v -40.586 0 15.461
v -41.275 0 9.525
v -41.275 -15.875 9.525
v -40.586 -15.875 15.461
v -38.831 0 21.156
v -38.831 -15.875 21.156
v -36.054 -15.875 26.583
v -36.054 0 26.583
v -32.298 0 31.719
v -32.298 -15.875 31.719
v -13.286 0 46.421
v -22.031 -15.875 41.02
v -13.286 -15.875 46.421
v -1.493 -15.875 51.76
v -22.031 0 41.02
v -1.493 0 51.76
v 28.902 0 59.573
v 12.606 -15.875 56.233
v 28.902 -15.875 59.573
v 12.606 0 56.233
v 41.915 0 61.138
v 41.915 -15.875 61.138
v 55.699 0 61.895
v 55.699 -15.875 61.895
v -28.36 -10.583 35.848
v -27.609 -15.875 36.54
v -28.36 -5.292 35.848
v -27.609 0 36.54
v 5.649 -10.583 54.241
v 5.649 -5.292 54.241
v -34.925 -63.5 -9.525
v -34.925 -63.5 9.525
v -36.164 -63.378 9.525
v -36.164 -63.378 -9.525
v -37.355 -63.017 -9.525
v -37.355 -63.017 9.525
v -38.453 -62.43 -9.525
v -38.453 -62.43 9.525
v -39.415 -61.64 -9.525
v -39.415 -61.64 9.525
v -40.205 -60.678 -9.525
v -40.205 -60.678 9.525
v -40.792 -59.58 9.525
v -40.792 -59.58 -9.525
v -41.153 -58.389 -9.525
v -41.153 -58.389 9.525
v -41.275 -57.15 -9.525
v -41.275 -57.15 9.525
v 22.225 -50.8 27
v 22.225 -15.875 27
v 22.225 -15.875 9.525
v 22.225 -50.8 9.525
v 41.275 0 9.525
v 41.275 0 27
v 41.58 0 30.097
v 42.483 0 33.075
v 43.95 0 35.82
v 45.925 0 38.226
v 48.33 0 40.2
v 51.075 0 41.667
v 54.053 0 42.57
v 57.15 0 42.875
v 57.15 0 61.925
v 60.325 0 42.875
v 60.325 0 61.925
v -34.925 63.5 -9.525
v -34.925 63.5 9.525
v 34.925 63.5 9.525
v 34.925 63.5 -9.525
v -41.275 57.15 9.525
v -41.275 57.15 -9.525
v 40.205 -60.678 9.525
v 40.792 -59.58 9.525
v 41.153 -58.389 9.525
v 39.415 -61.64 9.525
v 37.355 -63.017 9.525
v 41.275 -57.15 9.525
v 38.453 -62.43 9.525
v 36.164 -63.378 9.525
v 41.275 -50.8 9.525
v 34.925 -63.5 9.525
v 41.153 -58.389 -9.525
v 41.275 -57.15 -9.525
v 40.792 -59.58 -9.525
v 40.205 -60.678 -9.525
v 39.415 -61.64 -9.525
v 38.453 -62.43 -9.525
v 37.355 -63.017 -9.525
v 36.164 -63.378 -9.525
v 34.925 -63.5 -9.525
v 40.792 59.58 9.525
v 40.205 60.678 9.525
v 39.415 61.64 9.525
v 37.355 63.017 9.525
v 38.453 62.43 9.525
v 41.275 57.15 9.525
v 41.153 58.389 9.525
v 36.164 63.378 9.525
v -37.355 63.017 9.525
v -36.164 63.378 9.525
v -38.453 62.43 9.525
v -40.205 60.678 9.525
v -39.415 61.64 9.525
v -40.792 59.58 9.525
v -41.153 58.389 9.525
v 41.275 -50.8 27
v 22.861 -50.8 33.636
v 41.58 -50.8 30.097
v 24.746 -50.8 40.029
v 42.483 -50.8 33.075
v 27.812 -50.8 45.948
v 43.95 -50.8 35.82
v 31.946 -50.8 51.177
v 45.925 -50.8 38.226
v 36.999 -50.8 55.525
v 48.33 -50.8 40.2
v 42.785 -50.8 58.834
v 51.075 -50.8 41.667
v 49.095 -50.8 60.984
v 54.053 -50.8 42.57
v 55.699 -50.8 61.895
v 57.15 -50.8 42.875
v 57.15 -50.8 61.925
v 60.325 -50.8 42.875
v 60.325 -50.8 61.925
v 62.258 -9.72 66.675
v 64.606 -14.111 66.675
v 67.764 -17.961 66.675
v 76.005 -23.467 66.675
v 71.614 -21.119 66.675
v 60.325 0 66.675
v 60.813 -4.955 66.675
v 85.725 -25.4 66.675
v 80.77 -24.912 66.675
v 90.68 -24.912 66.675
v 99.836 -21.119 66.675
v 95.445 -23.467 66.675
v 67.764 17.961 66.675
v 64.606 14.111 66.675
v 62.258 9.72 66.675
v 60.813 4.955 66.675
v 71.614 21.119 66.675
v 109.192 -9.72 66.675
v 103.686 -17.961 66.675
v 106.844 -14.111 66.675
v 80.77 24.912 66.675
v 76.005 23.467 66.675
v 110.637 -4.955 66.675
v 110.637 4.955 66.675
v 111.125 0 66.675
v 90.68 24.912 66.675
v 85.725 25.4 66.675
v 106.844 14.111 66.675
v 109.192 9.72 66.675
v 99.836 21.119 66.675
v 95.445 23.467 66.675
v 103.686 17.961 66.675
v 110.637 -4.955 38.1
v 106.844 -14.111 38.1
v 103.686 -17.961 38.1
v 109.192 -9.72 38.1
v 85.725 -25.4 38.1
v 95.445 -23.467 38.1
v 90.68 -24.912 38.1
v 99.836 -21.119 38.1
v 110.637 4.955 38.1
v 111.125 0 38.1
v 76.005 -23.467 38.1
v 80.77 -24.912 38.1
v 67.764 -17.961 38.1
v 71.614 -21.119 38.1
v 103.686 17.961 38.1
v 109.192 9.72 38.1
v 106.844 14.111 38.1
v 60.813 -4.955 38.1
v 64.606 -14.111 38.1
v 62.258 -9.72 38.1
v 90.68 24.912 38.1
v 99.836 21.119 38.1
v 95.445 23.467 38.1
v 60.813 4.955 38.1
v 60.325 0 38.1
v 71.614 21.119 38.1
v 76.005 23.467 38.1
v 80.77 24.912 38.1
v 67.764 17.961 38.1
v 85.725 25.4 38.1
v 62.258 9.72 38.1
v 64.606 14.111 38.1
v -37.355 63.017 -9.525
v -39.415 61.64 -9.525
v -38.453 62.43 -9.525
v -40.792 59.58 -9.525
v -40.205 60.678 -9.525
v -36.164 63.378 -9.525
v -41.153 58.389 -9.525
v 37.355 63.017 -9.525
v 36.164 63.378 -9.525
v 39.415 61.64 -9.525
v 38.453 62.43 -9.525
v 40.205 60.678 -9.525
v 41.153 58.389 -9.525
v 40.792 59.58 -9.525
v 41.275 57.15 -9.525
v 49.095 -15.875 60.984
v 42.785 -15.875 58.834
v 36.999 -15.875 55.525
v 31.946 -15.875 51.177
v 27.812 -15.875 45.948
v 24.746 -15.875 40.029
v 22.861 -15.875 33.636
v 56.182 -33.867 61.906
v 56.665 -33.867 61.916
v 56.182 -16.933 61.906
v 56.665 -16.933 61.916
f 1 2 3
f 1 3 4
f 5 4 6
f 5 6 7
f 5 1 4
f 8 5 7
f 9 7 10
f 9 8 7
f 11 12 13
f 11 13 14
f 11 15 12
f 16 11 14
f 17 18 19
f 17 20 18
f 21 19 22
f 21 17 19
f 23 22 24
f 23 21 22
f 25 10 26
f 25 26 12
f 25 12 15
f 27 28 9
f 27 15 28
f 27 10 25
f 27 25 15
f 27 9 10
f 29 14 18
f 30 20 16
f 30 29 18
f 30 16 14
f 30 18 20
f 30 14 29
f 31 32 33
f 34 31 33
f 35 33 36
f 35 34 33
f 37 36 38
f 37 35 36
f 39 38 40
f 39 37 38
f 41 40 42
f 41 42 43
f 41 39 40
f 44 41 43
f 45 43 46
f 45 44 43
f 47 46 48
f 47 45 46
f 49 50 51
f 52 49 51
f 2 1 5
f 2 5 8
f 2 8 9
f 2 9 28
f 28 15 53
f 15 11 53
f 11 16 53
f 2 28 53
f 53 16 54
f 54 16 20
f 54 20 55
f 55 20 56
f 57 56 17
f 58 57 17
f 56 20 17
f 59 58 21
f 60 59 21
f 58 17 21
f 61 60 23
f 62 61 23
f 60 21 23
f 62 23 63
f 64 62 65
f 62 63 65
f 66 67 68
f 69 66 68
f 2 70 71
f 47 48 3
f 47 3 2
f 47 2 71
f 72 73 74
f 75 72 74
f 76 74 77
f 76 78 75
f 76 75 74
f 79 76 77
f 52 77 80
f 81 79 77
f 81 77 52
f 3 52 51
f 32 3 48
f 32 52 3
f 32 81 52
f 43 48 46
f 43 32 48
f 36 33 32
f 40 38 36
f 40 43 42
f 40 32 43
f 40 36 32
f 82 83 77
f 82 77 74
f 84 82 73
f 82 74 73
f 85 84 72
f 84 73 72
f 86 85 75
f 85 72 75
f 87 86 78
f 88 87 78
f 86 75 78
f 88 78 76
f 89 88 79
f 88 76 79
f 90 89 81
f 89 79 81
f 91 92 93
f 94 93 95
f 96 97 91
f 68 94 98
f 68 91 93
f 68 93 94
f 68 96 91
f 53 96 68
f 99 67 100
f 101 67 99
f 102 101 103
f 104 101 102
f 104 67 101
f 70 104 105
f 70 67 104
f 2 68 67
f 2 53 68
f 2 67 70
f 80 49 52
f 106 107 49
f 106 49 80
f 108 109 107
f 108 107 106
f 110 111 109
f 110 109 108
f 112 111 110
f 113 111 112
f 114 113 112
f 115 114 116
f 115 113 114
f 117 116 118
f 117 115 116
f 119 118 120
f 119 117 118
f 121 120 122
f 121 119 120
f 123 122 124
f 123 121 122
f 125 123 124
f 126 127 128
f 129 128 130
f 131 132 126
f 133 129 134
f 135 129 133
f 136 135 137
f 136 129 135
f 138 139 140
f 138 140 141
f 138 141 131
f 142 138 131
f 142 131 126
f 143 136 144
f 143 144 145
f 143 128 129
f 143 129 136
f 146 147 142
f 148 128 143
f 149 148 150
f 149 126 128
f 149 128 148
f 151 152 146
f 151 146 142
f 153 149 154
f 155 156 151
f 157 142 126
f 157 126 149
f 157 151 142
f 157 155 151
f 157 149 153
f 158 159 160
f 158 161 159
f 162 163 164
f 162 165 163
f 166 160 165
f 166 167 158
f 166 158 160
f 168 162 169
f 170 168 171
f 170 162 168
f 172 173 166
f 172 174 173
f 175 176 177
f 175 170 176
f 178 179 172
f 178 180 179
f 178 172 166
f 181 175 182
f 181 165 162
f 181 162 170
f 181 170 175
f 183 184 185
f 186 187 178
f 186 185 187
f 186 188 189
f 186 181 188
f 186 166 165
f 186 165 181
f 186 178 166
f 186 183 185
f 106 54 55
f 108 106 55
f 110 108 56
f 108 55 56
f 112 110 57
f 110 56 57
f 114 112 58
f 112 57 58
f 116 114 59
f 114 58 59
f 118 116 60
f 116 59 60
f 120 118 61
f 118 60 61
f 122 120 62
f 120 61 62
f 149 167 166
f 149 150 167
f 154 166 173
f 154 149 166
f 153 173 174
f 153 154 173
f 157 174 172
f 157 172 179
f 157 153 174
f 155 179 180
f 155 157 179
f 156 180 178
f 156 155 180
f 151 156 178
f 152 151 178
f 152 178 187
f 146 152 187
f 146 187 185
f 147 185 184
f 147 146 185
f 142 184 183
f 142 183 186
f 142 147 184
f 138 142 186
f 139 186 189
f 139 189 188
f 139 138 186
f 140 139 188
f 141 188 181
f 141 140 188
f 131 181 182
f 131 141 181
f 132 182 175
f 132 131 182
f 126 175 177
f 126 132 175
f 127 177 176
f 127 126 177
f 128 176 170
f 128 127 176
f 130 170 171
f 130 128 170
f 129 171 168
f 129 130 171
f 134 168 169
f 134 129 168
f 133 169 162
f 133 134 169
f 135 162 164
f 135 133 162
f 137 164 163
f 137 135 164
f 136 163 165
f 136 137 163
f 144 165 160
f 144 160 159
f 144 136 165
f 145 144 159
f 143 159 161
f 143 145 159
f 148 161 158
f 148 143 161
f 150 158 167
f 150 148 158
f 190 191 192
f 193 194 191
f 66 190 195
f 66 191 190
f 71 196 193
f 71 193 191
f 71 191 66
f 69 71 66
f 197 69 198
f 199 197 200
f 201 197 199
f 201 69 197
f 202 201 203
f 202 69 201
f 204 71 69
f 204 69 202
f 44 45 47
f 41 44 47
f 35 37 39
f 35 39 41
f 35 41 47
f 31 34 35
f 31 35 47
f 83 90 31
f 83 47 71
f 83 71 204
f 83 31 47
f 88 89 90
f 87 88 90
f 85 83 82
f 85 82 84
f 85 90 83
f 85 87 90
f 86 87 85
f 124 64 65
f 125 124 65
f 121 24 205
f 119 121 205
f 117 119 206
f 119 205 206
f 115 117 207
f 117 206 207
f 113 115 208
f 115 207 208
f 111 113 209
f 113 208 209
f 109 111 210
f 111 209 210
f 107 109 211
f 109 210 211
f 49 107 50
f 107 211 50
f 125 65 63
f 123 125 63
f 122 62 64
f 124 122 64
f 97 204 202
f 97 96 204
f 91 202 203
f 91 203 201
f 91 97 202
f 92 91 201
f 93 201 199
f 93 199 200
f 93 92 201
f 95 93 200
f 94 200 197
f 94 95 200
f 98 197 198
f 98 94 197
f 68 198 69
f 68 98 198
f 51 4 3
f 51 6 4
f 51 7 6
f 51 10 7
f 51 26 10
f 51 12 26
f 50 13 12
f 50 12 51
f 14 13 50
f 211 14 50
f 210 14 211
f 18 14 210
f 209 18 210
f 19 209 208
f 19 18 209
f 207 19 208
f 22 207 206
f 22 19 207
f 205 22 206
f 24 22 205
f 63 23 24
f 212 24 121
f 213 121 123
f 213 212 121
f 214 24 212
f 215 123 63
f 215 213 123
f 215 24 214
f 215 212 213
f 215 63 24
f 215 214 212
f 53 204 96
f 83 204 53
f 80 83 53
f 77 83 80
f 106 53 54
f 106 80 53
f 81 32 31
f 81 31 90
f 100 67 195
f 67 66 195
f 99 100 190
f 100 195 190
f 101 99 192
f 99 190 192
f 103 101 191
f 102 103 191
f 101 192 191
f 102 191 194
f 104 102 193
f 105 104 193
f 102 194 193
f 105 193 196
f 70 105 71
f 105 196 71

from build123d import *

# Parameters (mm, degrees)
F1_DEPTH = 63.5
F2_DEPTH = 50.8
F3_DEPTH = 15.875
F5_R     = 6.35


with BuildPart() as f1:
    # F0 (on Front) → F1 (new body, symmetric)
    with BuildSketch(Plane.XZ):
        Polygon((41.275, -9.525), (41.275, 9.525), (22.225, 9.525), (-41.275, 9.525), (-41.275, -9.525), align=None)
    extrude(amount=F1_DEPTH, both=True)

    # F0 (on Front) → F2 (join)
    with BuildSketch(Plane.XZ):
        with BuildLine():
            Line((22.225, 9.525), (41.275, 9.525))
            Line((41.275, 9.525), (41.275, 27.0002))
            ThreePointArc((41.275, 27.0002), (45.92468, 38.22552), (57.15, 42.8752))
            Line((57.15, 42.8752), (60.325, 42.8752))
            Line((60.325, 42.8752), (60.325, 61.9252))
            Line((60.325, 61.9252), (57.15, 61.9252))
            add(Edge.make_bspline(
                [(55.698656, 61.895031), (56.181235, 61.906578), (56.665021, 61.916637), (57.15, 61.9252)],
                knots=[110.558301, 110.558301, 110.558301, 110.558301, 111.504536, 111.504536, 111.504536, 111.504536], degree=3))
            ThreePointArc((55.698656, 61.895031), (31.946391, 51.177332), (22.225, 27.0002))
            Line((22.225, 27.0002), (22.225, 9.525))
        make_face()
    extrude(amount=F2_DEPTH)

    # F0 (on Front) → F3 (join)
    with BuildSketch(Plane.XZ):
        with BuildLine():
            Line((-41.275, 9.525), (22.225, 9.525))
            Line((22.225, 9.525), (22.225, 27.0002))
            ThreePointArc((22.225, 27.0002), (31.946391, 51.177332), (55.698656, 61.895031))
            add(Edge.make_bspline(
                [(-41.275, 9.525), (-40.59176, 38.8765), (-0.685957, 60.545822), (55.698656, 61.895031)],
                knots=[0, 0, 0, 0, 110.558301, 110.558301, 110.558301, 110.558301], degree=3))
        make_face()
    extrude(amount=F3_DEPTH)

    # F5
    f5_edges = [f1.edges().sort_by_distance(p)[0] for p in [
        (41.275, -63.5, 0),
        (-41.275, -63.5, 0),
        (41.275, 63.5, 0),
        (-41.275, 63.5, 0),
    ]]
    fillet(f5_edges, radius=F5_R)


with BuildPart() as f4:
    # F0 (on Front) → F4 (revolve)
    with BuildSketch(Plane.XZ):
        Polygon((85.725, 61.9252), (85.725, 42.8752), (85.725, 38.1), (111.125, 38.1), (111.125, 66.675), (85.725, 66.675), align=None)
    revolve(axis=Axis((85.725, 0, 52.3875), (0, 0, 1)))


solid = Compound([f1.part, f4.part])
